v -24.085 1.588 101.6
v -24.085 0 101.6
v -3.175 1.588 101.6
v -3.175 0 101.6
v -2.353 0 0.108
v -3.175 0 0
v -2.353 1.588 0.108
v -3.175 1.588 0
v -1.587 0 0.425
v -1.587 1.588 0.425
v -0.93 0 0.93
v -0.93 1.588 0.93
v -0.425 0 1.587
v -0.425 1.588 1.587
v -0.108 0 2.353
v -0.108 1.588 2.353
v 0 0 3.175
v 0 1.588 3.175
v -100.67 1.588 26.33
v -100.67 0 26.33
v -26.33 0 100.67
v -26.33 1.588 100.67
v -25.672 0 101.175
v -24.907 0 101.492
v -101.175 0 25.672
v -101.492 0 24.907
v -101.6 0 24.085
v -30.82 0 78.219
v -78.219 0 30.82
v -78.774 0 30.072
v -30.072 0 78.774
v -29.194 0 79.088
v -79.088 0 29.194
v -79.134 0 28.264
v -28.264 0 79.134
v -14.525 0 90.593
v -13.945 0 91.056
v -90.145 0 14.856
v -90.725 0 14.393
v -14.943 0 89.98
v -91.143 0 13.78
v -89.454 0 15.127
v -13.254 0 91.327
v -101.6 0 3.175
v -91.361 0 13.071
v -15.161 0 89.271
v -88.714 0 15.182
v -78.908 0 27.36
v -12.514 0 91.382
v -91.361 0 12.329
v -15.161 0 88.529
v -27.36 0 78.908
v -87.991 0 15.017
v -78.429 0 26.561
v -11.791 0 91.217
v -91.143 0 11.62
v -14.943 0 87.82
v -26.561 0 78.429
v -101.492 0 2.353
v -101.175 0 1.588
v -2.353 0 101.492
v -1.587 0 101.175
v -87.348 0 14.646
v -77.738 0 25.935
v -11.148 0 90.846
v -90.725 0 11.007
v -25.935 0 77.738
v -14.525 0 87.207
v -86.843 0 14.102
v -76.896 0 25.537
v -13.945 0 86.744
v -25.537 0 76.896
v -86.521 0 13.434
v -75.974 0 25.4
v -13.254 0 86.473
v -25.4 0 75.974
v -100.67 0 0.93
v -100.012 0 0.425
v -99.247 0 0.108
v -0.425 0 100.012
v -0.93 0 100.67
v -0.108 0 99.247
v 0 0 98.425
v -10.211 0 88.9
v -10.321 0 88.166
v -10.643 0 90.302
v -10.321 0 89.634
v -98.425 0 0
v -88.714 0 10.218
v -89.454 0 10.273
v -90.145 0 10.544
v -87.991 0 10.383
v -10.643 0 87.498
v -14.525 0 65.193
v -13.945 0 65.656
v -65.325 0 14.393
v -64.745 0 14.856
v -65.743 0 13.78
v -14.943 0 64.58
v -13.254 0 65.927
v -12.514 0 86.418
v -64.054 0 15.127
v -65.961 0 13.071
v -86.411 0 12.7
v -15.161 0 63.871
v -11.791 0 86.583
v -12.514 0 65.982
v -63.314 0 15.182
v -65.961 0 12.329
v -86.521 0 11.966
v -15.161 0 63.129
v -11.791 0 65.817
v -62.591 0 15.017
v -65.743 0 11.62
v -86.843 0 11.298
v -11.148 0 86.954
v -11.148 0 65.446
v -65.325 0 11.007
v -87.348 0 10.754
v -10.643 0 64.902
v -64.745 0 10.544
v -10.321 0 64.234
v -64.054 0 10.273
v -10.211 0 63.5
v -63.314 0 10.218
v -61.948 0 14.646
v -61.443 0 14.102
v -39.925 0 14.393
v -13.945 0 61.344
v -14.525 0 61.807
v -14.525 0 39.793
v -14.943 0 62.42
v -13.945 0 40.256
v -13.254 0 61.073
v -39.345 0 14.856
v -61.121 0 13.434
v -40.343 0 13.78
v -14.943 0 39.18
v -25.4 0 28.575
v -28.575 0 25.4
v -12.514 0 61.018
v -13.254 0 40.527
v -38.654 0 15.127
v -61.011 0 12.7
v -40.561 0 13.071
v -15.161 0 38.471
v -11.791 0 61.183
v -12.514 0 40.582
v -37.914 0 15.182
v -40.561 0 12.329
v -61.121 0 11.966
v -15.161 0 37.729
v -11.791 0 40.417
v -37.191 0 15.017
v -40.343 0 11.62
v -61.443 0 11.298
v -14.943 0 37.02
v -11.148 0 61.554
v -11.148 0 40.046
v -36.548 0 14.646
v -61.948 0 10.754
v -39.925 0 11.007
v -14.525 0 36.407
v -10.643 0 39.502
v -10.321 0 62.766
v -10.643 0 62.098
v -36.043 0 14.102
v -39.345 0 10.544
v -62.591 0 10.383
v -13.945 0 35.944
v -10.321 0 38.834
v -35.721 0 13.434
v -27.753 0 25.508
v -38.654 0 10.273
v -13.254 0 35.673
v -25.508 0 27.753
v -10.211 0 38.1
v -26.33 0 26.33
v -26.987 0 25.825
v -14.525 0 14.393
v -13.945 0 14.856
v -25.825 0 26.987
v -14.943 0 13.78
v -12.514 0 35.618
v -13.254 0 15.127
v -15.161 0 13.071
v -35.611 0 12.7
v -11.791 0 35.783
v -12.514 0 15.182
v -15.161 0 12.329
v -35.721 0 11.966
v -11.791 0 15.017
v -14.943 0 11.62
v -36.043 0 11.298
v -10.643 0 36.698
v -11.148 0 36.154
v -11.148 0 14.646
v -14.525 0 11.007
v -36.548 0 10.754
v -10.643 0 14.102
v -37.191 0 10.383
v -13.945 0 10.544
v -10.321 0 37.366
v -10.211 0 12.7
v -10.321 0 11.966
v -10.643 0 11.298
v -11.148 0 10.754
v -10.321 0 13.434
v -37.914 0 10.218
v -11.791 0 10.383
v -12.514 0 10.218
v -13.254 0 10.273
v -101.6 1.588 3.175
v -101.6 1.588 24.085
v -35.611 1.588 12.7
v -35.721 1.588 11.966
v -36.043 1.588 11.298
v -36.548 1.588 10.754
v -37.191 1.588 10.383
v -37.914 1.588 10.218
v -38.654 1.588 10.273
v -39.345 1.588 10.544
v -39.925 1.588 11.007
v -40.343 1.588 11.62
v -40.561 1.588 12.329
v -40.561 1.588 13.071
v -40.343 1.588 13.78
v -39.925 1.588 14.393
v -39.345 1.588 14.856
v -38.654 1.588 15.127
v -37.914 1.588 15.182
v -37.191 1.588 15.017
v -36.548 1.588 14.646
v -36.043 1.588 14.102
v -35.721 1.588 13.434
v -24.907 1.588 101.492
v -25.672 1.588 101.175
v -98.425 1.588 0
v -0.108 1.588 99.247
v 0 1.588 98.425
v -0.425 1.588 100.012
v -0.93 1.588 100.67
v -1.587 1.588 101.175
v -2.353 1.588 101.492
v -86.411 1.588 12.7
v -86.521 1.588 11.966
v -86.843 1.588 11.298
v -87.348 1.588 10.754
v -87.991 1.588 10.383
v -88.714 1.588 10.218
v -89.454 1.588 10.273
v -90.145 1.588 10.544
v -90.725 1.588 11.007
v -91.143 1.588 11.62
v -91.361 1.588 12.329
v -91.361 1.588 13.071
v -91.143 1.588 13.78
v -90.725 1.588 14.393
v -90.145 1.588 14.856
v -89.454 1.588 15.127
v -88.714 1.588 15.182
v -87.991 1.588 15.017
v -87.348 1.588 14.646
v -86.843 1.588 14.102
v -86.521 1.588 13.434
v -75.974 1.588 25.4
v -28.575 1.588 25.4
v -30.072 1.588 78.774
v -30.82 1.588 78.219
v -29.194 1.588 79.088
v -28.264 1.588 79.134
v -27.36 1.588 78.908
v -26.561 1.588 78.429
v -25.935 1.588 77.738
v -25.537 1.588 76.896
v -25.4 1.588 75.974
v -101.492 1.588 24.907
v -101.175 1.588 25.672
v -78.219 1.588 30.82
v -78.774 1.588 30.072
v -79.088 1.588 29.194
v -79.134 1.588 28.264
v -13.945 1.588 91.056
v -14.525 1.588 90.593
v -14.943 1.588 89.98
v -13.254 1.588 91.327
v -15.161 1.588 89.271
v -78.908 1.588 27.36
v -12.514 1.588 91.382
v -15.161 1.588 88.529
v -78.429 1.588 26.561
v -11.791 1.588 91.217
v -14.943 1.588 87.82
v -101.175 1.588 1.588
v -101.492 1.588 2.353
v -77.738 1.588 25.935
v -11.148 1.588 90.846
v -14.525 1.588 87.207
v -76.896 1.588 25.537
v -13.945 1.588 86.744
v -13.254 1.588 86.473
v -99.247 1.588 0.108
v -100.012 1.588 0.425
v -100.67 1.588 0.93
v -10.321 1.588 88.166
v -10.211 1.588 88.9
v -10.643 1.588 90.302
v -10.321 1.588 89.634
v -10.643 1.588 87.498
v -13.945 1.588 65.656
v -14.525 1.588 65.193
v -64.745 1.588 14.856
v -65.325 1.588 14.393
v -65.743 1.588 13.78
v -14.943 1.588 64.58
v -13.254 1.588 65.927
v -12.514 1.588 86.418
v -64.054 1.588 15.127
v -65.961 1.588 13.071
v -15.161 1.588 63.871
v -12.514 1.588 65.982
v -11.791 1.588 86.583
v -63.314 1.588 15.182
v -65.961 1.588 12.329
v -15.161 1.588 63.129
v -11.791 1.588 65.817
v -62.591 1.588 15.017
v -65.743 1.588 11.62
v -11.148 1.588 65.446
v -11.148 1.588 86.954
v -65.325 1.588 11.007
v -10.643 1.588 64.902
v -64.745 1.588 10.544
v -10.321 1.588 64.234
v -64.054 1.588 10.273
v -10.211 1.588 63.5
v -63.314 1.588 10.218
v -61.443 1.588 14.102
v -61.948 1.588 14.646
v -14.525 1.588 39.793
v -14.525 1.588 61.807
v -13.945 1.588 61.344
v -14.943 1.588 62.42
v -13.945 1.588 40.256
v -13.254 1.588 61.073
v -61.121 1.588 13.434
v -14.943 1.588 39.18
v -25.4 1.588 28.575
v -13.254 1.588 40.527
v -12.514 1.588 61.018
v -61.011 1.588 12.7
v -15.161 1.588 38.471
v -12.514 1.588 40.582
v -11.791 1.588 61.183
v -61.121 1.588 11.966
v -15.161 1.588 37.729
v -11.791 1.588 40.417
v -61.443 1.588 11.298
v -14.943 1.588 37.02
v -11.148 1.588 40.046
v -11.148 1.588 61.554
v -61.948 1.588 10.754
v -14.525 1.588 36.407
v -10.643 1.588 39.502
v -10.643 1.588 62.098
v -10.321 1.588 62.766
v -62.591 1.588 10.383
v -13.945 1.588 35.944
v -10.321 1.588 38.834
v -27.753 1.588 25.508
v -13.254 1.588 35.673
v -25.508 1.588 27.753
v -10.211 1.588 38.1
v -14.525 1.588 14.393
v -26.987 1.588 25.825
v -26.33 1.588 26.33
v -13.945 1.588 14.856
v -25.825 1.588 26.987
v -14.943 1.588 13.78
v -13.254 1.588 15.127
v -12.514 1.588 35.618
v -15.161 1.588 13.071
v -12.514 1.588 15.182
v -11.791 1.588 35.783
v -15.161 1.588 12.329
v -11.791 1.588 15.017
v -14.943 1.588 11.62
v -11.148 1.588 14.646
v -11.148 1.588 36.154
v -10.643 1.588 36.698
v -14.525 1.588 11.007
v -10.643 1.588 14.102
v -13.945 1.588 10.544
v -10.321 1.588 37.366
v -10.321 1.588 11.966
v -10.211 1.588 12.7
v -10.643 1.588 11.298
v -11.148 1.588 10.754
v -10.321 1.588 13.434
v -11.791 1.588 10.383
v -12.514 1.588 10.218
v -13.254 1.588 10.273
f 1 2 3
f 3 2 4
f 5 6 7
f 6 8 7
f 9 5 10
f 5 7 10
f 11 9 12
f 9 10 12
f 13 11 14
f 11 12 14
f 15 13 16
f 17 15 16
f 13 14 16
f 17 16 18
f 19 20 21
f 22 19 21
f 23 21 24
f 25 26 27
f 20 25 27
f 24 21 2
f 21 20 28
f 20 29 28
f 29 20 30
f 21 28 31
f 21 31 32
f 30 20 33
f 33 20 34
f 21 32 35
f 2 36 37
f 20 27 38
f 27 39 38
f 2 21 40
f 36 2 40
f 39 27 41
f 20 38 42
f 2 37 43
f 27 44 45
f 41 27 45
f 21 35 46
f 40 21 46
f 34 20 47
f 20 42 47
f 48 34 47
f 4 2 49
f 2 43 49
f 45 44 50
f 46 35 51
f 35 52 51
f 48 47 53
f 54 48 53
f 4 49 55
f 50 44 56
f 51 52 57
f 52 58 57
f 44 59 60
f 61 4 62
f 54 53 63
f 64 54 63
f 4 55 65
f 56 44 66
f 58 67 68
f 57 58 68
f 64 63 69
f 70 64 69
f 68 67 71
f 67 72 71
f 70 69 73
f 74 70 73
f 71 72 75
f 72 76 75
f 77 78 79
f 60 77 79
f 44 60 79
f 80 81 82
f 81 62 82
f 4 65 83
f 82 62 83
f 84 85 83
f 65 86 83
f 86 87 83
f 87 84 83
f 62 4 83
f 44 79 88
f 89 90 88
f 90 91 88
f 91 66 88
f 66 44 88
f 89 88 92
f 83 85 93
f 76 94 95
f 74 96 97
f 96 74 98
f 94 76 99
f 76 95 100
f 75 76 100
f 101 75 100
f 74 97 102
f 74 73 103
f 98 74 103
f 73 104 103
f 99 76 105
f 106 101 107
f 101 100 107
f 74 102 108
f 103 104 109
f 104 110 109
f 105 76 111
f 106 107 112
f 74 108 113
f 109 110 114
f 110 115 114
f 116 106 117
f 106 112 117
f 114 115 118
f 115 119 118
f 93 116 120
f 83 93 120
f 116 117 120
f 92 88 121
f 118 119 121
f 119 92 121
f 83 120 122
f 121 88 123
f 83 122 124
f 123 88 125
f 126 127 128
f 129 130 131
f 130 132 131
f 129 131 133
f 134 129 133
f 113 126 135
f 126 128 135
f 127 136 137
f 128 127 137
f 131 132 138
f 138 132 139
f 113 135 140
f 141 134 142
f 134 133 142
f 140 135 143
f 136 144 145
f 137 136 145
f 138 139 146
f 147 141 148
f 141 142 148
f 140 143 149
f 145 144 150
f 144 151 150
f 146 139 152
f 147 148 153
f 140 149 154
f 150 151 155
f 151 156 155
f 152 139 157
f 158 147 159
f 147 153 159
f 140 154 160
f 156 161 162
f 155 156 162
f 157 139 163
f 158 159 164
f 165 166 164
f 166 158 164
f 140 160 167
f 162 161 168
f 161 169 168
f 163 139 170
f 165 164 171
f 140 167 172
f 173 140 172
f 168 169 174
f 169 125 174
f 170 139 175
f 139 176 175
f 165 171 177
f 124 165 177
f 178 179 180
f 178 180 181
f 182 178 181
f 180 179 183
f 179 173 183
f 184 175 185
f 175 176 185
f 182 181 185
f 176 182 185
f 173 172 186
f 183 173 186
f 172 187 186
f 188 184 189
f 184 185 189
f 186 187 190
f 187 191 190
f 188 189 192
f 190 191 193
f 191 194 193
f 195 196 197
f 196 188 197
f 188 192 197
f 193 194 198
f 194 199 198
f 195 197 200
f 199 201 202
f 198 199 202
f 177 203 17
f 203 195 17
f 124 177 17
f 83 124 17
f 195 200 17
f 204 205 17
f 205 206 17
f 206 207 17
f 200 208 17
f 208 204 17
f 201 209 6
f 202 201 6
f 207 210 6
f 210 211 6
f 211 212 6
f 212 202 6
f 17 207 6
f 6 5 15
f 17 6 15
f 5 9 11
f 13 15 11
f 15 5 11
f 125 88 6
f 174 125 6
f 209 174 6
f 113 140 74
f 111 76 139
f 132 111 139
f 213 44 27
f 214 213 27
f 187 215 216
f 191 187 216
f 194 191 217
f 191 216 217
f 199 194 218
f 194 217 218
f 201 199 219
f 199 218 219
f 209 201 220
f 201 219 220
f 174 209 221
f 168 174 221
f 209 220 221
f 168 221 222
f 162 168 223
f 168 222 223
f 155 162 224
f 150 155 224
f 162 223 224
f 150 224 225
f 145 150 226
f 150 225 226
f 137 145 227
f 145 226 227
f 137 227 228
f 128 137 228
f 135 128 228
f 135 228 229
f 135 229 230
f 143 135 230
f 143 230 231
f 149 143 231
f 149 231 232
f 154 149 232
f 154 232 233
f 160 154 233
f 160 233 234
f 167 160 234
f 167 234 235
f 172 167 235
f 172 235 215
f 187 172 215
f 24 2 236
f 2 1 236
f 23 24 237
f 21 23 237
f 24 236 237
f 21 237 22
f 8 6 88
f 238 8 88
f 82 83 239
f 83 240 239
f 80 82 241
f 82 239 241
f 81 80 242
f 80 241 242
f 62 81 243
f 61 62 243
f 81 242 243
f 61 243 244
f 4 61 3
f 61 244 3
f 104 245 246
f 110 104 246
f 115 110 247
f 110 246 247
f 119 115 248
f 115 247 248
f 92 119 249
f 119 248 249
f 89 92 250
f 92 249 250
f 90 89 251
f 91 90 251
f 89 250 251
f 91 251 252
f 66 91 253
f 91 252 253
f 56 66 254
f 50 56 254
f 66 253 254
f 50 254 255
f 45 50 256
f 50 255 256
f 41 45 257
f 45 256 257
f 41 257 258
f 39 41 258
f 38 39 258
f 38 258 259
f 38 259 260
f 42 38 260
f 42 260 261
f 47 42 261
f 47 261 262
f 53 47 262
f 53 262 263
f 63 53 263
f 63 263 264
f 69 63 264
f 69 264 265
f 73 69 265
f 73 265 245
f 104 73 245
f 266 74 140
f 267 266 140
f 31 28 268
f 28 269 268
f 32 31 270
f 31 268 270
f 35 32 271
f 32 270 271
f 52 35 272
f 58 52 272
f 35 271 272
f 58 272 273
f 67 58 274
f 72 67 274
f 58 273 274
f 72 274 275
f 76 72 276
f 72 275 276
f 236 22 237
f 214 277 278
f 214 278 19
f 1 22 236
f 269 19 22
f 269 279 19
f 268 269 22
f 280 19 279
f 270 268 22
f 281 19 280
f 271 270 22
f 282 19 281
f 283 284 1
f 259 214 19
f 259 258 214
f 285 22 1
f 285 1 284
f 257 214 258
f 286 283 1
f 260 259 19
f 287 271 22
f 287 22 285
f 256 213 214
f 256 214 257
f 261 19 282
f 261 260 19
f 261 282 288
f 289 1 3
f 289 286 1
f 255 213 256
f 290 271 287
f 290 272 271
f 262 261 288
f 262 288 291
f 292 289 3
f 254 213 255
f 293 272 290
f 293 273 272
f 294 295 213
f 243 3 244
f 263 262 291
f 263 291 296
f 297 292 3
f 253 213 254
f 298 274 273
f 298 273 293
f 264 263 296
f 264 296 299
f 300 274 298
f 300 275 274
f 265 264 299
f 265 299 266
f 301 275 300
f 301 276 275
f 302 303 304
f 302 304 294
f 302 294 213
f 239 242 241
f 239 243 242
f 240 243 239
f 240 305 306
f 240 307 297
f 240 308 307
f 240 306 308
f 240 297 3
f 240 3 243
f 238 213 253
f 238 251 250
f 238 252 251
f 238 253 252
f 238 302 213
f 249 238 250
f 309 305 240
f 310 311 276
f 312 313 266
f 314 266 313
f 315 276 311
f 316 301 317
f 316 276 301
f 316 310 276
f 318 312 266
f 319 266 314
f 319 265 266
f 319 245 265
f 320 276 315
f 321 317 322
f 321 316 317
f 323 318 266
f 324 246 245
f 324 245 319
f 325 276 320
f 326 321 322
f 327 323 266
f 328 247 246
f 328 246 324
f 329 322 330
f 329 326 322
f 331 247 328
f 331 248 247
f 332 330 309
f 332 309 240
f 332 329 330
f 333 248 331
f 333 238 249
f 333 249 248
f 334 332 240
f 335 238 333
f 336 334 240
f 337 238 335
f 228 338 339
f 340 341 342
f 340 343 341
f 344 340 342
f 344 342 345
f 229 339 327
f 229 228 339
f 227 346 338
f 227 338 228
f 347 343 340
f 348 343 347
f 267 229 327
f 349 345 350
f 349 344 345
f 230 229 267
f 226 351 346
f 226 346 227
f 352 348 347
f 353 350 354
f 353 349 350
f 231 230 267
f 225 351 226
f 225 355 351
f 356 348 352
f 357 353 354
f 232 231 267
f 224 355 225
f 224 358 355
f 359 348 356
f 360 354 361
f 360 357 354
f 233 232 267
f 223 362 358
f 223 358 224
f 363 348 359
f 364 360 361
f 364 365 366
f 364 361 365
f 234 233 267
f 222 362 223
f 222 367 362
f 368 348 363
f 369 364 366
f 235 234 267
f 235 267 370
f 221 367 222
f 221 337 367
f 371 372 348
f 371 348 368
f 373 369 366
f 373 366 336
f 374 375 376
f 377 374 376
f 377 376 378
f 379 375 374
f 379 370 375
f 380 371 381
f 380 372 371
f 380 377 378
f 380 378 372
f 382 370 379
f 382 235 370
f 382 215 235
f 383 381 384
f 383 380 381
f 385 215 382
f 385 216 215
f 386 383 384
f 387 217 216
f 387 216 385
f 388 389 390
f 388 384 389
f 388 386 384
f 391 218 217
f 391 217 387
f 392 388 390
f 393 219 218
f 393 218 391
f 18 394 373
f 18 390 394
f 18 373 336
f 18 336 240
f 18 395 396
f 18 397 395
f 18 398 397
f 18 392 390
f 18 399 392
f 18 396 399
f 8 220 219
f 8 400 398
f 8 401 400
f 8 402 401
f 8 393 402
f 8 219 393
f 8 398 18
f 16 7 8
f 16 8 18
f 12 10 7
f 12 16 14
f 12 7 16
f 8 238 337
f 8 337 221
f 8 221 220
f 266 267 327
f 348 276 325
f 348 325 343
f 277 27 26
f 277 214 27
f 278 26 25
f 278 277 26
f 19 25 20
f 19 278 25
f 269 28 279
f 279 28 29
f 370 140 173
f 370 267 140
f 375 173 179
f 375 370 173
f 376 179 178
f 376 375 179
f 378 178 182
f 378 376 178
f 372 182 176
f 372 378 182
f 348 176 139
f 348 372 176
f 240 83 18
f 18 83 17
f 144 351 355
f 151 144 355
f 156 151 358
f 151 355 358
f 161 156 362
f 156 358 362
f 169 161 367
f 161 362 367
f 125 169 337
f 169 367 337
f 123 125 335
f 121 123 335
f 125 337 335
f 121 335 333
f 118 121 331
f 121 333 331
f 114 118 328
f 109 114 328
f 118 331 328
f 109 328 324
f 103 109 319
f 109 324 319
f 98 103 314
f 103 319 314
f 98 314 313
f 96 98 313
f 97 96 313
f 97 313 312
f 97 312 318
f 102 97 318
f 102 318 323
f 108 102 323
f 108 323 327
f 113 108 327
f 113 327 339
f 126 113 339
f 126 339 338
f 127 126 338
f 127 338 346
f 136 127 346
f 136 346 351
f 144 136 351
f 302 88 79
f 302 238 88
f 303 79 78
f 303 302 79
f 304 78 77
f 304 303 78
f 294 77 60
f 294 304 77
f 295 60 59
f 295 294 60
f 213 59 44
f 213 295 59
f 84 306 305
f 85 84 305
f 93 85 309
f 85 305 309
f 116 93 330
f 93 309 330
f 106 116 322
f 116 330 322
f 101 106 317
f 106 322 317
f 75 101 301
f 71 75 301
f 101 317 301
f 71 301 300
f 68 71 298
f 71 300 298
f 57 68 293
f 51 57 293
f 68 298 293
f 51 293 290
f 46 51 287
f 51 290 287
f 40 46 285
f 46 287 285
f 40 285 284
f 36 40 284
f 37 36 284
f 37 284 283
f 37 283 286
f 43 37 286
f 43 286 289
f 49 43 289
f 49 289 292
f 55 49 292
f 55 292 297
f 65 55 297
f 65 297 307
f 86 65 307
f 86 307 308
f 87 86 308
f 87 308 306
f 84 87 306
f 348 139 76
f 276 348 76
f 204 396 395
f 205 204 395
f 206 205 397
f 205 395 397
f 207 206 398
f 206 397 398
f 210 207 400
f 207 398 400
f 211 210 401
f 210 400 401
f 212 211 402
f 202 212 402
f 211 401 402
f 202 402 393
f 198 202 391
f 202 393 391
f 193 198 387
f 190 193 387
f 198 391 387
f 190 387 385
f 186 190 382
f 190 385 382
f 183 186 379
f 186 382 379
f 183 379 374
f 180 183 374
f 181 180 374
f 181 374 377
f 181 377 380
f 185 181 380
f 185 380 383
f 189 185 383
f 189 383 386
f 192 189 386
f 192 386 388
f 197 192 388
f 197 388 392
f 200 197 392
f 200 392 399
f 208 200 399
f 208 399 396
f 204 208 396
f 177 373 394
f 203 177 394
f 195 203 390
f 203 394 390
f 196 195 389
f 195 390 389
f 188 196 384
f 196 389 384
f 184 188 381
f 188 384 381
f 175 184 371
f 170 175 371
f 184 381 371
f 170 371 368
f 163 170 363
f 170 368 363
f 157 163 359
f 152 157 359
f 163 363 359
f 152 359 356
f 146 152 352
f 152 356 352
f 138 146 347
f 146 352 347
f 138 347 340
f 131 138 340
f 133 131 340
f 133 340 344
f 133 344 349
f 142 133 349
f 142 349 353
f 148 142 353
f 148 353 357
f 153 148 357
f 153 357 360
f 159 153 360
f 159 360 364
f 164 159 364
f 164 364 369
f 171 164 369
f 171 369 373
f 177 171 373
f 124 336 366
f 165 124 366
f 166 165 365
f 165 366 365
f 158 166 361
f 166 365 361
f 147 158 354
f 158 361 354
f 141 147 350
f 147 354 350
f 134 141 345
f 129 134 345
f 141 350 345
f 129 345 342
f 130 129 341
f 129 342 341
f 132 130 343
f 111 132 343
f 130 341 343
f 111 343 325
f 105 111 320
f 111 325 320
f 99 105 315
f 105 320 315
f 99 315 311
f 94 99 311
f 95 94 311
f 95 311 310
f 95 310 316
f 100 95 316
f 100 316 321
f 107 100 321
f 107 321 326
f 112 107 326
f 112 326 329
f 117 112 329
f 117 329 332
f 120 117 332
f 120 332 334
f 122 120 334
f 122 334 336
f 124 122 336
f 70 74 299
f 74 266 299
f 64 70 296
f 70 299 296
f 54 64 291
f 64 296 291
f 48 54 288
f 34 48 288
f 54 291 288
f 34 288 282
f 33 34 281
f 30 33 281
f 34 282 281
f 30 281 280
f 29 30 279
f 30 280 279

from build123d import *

# Parameters (mm, degrees)
BOSS_EXTRUDE1_DEPTH = 1.5875
SKETCH2_R           = 2.4892
CUT_EXTRUDE1_DEPTH  = 2.5875
LPATTERN1_COUNT     = 4
LPATTERN1_PITCH     = 25.4
LPATTERN1_COL_COUNT = 4
LPATTERN1_COL_PITCH = 25.4
FILLET1_R           = 3.175


with BuildPart() as part:
    # Sketch1 → Boss-Extrude1 (new body)
    with BuildSketch(Plane(origin=(0, 0, 0), x_dir=(1, 0, 0), z_dir=(0, 1, 0))):
        Polygon((0, 0), (-101.6, 0), (-101.6, -25.4), (-25.4, -101.6), (0, -101.6), align=None)
        Polygon((-25.4, -25.4), (-25.4, -83.639487758), (-83.639487758, -25.4), align=None, mode=Mode.SUBTRACT)
    extrude(amount=BOSS_EXTRUDE1_DEPTH)

    # Sketch2 → Cut-Extrude1 (cut, through all)
    with BuildSketch(Plane(origin=(0, 1.5875, 0), x_dir=(1, 0, 0), z_dir=(0, 1, 0))):
        with Locations((-12.7, -12.7)):
            Circle(SKETCH2_R)
    cut_extrude1 = extrude(amount=-CUT_EXTRUDE1_DEPTH, mode=Mode.SUBTRACT)

    # LPattern1: Cut-Extrude1 ×4
    with Locations(*[(0, 0, i * LPATTERN1_PITCH) for i in range(1, LPATTERN1_COUNT)]):
        add(cut_extrude1, mode=Mode.SUBTRACT)

    # LPattern1 col: Cut-Extrude1 ×4
    with Locations(*[(-i * LPATTERN1_COL_PITCH, 0, 0) for i in range(1, LPATTERN1_COL_COUNT)]):
        add(cut_extrude1, mode=Mode.SUBTRACT)

    # Fillet1
    fillet1_edges = [part.edges().sort_by_distance(p)[0] for p in [
        (-83.639487758, 0.79375, 25.4),
        (-25.4, 0.79375, 83.639487758),
        (-25.4, 0.79375, 25.4),
        (0, 0.79375, 101.6),
        (-25.4, 0.79375, 101.6),
        (-101.6, 0.79375, 25.4),
        (-101.6, 0.79375, 0),
        (0, 0.79375, 0),
    ]]
    fillet(fillet1_edges, radius=FILLET1_R)


solid = part.part
